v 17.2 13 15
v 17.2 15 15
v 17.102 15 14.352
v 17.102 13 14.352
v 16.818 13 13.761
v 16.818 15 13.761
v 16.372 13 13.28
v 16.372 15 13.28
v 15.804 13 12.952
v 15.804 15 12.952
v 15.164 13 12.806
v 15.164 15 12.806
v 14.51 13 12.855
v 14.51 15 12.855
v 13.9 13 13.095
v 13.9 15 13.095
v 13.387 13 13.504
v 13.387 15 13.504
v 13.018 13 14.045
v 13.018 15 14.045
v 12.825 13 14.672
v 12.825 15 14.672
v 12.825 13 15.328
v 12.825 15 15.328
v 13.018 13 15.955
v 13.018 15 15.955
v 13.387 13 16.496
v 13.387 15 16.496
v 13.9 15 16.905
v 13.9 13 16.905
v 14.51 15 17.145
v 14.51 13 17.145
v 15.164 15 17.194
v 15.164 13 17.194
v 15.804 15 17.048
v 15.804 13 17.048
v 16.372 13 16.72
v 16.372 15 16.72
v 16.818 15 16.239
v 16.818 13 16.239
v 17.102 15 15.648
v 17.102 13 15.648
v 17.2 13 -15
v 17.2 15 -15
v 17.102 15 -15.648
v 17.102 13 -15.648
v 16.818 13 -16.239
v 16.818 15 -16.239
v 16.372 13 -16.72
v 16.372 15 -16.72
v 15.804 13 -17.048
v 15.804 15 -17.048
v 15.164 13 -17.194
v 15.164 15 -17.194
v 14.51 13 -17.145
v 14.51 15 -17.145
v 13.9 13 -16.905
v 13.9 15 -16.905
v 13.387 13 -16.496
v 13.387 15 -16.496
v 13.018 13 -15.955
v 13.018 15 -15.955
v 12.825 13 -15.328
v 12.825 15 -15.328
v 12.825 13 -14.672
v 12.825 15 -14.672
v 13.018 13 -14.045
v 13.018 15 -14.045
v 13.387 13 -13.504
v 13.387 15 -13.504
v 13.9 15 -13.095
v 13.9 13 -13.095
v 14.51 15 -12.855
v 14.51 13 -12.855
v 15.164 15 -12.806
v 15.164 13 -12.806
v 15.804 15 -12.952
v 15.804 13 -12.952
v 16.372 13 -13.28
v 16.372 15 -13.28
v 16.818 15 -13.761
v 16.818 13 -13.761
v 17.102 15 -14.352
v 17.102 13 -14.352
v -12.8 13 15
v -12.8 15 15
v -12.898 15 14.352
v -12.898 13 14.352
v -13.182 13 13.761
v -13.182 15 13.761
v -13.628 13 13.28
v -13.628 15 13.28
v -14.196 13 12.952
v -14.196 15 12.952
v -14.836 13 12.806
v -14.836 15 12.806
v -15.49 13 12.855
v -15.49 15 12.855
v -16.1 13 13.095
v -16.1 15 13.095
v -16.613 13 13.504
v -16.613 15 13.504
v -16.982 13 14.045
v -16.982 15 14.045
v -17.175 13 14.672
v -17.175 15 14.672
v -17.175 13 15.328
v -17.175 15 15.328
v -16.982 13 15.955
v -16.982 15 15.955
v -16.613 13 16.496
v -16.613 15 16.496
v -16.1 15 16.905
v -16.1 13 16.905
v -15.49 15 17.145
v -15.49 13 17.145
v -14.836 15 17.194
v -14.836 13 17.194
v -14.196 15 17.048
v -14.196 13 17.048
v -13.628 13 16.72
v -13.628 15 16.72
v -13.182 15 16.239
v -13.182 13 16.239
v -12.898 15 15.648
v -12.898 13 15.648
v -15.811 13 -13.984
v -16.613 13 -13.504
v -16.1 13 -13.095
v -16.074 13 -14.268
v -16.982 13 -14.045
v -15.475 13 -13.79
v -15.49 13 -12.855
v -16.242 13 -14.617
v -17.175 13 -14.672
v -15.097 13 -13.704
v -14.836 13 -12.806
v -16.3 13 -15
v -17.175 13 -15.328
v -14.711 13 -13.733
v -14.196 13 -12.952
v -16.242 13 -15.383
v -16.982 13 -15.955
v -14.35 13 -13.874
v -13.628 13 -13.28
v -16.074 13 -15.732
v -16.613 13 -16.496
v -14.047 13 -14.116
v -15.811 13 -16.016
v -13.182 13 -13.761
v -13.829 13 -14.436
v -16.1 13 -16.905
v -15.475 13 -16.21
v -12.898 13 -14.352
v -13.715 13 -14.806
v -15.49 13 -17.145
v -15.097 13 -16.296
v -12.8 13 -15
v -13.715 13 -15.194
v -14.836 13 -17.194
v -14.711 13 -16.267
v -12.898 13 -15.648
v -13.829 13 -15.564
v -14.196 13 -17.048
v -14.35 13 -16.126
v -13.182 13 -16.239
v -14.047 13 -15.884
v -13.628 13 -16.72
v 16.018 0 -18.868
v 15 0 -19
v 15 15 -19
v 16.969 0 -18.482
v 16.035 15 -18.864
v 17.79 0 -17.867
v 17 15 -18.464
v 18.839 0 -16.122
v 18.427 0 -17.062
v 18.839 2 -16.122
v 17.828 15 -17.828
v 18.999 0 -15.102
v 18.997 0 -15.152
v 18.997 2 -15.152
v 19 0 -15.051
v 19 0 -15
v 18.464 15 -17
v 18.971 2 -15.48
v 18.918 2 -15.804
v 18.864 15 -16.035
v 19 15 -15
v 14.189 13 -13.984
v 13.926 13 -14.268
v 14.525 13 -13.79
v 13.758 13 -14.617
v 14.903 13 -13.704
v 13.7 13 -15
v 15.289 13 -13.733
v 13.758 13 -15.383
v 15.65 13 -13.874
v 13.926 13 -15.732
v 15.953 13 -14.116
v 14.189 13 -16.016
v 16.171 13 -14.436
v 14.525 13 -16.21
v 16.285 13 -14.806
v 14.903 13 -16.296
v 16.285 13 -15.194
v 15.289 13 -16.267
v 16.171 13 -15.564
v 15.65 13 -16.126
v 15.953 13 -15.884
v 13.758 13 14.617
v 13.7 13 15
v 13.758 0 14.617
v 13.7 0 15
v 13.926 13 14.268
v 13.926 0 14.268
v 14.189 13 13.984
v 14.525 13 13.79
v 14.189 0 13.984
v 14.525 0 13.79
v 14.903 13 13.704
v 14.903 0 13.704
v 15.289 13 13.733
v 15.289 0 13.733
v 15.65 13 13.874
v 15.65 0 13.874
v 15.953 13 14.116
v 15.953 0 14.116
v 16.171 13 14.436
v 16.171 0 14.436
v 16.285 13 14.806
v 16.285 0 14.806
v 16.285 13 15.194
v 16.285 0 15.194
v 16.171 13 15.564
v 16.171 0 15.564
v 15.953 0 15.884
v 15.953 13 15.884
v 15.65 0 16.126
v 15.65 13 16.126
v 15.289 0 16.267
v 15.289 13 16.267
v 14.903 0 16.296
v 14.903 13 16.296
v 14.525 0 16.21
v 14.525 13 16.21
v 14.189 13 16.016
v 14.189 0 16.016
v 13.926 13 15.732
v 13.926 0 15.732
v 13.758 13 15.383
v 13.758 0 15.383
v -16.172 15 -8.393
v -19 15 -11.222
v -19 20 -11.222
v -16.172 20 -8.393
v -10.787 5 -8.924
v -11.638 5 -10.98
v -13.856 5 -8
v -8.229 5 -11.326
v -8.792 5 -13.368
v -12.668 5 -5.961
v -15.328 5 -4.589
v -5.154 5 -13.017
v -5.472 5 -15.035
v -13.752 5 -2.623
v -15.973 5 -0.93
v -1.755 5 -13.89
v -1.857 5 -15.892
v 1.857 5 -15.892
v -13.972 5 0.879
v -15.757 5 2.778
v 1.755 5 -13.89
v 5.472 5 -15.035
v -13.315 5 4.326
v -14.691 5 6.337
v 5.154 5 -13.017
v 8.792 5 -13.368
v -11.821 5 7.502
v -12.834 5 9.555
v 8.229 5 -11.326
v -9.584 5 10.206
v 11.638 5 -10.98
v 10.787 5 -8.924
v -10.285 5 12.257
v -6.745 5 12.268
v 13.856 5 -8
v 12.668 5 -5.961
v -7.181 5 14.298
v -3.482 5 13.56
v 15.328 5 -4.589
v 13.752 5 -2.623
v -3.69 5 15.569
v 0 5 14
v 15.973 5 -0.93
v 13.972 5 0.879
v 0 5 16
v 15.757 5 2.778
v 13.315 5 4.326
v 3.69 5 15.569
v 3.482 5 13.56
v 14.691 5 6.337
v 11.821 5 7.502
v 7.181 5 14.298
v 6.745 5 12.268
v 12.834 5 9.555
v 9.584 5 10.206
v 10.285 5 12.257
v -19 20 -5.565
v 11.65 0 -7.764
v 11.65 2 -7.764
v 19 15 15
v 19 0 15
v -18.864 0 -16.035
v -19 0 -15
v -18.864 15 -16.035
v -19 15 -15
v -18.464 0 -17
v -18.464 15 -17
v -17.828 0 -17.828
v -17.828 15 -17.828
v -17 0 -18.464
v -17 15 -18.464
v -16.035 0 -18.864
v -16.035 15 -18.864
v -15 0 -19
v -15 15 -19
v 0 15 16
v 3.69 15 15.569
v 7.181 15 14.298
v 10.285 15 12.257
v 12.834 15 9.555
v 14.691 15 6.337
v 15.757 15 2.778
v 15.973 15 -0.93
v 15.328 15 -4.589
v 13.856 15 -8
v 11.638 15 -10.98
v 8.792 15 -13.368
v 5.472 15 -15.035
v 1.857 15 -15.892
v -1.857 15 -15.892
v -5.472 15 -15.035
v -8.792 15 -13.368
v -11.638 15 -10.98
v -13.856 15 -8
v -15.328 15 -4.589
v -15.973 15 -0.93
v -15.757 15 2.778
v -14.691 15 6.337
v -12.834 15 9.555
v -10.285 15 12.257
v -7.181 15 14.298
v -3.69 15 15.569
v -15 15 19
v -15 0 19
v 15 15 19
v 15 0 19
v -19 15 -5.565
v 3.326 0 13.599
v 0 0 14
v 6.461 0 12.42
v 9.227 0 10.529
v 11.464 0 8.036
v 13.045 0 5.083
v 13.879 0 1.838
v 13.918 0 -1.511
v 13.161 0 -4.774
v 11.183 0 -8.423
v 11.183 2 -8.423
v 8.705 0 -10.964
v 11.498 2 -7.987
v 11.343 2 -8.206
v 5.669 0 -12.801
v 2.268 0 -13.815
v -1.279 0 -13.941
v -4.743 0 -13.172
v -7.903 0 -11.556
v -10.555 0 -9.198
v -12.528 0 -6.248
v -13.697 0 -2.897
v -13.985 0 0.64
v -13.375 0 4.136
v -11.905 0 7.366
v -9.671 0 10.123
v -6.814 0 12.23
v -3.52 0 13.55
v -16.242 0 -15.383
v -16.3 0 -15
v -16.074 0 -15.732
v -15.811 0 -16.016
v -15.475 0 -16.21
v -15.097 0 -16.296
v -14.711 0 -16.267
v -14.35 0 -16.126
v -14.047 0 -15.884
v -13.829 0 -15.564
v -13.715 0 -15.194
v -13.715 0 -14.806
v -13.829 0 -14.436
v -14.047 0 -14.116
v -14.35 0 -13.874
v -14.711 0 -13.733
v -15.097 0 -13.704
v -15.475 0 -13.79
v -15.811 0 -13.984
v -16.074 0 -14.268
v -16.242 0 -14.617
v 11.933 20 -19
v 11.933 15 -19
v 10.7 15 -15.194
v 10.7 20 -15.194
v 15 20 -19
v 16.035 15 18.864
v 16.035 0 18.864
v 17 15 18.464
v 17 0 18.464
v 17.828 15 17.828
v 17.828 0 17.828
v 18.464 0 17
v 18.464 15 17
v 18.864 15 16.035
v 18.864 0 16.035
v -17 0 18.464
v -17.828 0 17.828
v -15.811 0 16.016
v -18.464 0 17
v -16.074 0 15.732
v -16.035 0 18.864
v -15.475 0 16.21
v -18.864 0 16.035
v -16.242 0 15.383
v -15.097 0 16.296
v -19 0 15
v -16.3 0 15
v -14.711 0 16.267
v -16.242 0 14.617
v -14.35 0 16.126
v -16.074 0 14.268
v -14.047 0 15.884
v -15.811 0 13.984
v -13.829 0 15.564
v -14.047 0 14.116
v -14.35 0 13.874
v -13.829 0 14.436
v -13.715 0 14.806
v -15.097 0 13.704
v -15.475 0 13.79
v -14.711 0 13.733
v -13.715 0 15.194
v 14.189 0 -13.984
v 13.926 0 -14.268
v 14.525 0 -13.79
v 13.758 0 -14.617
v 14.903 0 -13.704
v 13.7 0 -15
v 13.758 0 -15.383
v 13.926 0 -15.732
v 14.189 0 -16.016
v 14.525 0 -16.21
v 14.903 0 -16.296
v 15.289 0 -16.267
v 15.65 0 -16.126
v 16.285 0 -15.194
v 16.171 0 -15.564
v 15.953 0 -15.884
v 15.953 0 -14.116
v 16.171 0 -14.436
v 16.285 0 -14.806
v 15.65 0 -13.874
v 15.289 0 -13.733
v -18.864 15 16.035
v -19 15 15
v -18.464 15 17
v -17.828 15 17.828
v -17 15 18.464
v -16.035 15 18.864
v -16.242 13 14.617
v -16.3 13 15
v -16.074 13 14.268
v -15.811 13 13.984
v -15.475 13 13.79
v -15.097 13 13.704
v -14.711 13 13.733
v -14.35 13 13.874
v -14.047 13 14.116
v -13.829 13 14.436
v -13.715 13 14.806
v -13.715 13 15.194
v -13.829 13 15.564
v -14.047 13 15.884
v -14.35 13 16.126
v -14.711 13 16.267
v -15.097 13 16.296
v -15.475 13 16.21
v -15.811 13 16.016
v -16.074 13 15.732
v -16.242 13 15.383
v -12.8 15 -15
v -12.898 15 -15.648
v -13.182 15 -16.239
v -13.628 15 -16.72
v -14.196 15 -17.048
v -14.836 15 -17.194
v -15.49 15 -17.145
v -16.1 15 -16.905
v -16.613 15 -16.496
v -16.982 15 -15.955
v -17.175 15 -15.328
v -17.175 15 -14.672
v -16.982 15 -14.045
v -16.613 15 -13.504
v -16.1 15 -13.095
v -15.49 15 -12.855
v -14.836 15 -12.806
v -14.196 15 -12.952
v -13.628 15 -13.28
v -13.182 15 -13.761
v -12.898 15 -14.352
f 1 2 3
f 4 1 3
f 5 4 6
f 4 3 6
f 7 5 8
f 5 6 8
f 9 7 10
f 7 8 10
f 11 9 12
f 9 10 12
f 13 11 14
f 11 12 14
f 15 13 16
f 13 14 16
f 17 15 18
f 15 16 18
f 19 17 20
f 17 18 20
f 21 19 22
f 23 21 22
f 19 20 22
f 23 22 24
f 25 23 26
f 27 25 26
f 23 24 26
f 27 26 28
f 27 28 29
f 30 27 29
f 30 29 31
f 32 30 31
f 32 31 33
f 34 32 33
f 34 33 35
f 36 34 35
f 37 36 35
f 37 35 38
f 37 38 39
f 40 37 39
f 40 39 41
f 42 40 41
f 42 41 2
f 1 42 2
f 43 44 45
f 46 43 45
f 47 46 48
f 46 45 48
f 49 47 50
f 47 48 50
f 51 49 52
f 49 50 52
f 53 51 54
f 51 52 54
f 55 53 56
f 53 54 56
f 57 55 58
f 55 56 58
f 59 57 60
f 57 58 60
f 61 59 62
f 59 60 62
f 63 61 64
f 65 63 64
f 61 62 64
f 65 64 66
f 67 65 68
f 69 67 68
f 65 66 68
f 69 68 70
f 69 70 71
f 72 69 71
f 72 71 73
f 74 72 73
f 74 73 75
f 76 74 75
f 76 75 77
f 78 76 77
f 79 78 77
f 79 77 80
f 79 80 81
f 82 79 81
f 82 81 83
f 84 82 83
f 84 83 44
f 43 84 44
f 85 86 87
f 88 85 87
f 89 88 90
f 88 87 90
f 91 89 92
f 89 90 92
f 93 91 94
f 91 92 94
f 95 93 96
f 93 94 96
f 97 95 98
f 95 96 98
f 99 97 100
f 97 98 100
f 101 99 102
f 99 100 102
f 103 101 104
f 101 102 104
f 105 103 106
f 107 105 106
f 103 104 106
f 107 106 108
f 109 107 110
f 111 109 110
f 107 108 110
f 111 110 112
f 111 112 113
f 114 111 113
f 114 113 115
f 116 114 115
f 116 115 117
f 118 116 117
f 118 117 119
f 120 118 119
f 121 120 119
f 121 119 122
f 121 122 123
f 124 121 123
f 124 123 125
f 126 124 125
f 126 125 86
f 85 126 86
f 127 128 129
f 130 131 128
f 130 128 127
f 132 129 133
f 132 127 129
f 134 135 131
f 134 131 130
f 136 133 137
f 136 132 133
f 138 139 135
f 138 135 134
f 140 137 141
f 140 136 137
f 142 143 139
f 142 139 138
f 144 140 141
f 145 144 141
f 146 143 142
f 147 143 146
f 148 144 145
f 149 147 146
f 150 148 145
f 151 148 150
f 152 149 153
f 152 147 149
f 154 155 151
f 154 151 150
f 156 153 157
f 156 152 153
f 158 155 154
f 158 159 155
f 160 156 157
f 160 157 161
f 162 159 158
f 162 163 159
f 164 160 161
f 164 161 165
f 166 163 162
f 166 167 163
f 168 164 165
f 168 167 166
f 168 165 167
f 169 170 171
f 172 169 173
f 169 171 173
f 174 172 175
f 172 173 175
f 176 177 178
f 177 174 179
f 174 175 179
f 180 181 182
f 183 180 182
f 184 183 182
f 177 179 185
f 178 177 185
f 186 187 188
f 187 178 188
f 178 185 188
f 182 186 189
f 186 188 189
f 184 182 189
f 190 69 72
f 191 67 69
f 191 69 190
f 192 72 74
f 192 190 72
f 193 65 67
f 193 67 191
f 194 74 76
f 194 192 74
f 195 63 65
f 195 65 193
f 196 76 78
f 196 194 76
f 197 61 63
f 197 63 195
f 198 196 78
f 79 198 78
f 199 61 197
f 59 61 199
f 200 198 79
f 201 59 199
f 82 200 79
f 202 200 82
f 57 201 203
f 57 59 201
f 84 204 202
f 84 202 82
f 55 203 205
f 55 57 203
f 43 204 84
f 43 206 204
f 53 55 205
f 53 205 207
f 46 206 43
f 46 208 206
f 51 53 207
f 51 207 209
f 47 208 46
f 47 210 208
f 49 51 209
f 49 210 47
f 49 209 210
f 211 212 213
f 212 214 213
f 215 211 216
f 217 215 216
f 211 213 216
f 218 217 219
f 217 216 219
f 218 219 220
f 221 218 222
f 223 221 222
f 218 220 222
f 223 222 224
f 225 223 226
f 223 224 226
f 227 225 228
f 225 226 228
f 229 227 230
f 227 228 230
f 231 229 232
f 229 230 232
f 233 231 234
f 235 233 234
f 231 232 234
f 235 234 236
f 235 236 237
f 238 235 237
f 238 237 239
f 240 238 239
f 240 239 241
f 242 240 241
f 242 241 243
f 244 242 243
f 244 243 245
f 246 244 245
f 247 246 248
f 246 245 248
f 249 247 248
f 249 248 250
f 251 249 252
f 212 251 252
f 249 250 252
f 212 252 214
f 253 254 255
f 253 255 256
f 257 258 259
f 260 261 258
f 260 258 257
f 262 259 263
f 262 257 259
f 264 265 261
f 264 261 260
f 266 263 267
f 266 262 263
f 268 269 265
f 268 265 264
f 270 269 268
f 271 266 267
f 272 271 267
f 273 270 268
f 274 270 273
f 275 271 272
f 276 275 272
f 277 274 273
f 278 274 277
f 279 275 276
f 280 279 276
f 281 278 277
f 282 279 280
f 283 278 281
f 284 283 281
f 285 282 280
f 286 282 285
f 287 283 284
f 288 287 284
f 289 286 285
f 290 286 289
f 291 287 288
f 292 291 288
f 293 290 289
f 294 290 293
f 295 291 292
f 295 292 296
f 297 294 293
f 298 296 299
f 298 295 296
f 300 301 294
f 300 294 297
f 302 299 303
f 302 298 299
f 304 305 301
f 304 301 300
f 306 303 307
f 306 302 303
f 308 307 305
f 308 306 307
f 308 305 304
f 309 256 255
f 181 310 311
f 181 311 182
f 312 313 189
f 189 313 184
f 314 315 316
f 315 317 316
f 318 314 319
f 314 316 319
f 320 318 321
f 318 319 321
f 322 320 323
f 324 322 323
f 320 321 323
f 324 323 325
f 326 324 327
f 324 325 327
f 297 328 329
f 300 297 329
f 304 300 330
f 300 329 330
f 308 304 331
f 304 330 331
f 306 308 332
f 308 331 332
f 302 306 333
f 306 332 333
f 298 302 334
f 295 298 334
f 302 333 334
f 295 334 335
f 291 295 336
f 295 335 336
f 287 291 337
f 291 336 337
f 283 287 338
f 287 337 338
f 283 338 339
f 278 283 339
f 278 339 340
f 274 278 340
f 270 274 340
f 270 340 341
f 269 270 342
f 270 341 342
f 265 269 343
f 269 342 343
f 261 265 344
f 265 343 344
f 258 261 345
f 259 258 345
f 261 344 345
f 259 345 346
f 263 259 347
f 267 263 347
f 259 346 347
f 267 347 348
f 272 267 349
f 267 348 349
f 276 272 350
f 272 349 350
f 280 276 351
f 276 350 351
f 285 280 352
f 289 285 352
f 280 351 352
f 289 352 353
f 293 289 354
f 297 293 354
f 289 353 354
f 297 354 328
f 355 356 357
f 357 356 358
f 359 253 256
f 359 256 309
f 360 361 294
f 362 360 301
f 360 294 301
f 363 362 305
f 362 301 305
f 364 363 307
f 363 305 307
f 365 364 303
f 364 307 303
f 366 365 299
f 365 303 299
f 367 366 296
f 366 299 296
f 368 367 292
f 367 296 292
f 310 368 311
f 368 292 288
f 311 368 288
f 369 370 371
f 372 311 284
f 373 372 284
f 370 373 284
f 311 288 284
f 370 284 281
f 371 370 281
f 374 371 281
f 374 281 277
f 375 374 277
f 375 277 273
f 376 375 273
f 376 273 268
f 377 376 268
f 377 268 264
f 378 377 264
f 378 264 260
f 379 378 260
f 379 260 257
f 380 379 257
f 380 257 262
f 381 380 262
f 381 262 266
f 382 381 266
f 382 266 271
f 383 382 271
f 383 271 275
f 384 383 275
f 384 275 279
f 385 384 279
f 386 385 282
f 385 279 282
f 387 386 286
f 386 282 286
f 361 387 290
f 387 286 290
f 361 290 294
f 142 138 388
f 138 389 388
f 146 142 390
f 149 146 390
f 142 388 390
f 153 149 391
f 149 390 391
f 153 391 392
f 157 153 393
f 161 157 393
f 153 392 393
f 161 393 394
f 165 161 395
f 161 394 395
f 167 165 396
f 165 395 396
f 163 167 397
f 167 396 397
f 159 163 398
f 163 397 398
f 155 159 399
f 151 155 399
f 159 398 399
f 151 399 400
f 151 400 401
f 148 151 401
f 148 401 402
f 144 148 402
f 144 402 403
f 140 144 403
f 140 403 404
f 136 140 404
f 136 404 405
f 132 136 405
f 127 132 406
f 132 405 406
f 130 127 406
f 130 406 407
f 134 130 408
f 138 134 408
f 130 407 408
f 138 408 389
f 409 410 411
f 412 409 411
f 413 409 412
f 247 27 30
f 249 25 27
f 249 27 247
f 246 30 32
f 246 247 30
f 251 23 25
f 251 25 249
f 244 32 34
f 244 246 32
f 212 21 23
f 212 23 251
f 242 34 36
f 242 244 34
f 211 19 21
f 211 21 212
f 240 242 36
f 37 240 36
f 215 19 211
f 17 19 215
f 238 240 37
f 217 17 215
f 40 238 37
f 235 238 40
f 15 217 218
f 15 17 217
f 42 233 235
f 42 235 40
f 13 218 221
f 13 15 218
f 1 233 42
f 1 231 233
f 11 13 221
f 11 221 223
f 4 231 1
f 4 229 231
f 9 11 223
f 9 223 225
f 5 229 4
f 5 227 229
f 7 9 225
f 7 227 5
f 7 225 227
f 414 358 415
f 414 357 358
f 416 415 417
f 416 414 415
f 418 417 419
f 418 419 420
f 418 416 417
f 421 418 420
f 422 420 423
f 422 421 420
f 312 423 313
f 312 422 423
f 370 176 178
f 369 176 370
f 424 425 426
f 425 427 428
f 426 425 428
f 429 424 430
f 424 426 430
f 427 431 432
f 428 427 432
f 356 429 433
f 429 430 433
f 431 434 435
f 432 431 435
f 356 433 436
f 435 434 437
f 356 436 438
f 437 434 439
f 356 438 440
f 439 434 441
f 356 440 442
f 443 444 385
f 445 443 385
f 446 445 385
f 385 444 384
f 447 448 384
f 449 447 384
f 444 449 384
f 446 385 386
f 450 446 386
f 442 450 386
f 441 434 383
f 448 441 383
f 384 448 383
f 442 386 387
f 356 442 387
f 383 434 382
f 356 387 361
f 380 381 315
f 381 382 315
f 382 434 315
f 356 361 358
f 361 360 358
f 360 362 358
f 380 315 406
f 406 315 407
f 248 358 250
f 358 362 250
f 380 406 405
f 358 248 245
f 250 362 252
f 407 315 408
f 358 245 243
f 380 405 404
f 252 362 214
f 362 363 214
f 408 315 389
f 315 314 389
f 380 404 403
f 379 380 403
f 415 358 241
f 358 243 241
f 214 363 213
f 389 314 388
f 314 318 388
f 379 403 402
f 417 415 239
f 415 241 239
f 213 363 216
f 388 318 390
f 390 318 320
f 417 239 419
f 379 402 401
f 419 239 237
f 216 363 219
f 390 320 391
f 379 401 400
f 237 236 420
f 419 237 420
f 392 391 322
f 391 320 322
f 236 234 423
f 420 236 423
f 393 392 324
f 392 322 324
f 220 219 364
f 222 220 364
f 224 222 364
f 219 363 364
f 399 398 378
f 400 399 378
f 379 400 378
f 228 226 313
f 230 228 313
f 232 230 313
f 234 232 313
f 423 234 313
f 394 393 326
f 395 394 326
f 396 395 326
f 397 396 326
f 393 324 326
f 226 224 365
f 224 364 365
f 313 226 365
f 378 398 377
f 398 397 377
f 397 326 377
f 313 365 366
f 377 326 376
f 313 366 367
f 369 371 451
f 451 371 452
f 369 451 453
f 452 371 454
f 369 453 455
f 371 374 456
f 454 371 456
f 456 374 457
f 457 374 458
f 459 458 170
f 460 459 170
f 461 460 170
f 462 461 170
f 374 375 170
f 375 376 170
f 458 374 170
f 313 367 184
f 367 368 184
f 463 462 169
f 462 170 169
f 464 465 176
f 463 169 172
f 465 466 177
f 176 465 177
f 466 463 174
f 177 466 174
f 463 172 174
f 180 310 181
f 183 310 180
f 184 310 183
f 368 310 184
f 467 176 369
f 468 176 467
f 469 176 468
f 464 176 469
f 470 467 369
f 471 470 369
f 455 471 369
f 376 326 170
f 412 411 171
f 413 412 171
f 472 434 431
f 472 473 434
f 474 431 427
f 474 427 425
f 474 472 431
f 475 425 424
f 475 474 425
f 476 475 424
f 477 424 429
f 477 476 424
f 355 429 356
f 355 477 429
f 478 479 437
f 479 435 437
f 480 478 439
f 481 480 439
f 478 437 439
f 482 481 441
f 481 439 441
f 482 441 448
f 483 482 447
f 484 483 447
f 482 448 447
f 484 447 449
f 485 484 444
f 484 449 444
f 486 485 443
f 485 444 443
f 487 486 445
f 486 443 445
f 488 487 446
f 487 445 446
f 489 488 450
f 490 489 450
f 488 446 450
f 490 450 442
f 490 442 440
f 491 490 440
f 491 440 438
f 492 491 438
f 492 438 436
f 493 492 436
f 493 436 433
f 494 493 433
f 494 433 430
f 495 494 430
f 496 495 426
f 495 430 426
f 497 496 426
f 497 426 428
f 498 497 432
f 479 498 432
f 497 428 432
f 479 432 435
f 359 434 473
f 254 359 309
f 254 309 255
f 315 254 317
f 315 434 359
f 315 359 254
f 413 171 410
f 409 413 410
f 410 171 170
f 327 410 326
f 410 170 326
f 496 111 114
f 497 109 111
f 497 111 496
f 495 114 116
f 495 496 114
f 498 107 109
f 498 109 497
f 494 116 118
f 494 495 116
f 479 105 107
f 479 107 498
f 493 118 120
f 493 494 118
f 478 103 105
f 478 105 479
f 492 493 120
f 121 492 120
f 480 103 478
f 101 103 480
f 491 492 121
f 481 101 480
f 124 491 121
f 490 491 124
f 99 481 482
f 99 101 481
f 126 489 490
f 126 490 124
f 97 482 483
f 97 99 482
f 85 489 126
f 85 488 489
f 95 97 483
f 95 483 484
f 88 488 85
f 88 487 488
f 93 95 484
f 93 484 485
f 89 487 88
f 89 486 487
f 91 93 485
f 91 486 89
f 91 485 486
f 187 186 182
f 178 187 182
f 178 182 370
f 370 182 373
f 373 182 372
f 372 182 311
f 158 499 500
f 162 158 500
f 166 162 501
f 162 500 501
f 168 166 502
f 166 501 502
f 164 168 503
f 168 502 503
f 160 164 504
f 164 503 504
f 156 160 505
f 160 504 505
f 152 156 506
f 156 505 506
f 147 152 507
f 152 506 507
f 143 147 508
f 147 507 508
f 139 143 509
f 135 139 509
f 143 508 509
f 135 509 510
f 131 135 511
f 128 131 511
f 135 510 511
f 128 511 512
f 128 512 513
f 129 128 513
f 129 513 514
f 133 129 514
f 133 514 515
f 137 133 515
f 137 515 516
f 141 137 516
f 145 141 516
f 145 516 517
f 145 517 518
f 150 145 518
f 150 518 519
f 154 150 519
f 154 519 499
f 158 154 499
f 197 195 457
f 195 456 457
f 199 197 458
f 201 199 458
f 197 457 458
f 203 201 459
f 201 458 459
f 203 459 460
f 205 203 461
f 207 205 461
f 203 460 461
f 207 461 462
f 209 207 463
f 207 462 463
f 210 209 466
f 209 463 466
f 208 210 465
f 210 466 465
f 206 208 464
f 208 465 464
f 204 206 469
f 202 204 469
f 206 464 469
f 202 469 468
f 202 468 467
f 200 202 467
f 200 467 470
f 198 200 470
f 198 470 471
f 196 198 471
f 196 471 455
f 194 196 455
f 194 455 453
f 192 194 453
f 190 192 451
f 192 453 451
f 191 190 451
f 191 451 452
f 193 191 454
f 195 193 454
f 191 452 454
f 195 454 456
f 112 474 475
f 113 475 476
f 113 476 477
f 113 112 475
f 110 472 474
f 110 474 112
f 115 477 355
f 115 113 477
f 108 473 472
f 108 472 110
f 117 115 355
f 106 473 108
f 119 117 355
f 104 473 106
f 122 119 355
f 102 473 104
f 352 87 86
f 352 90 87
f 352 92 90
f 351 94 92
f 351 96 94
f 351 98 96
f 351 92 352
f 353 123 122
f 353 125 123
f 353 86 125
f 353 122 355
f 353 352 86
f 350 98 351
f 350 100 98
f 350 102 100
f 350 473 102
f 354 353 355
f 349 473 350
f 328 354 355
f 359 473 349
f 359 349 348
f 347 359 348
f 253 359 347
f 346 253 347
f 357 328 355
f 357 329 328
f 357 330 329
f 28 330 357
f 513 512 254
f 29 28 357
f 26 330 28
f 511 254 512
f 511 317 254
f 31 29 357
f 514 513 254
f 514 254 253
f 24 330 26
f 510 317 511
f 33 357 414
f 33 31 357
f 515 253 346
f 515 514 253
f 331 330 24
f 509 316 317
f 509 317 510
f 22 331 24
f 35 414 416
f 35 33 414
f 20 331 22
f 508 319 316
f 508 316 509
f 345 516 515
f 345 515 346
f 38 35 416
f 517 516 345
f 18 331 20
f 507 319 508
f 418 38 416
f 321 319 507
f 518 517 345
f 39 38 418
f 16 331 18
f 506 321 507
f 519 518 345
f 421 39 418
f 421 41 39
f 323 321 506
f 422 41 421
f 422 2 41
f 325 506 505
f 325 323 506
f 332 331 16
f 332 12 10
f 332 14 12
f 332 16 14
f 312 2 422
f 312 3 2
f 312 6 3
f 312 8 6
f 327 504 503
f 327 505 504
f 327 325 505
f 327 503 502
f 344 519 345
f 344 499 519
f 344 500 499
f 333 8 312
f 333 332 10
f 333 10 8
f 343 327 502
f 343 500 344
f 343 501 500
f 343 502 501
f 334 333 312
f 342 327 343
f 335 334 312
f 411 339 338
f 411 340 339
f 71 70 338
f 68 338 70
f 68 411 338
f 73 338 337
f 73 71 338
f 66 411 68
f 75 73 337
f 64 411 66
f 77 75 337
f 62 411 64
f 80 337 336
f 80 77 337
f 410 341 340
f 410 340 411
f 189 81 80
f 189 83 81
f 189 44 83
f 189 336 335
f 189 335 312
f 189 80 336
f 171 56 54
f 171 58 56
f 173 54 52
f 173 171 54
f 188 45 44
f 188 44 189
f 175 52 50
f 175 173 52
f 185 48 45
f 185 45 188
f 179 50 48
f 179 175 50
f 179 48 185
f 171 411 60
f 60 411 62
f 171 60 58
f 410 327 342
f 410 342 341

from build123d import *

# Parameters (mm, degrees)
SKETCH1_W                      = 38
SKETCH1_H                      = 38
BOSS_EXTRUDE1_DEPTH            = 15
SKETCH2_R                      = 16
CUT_EXTRUDE1_DEPTH             = 10
SKETCH2_3_R                    = 14
CUT_EXTRUDE3_DEPTH             = 31.773365107
FILLET1_R                      = 4
CBORE_FOR_M2_SHCS1_D           = 2.6
CBORE_FOR_M2_SHCS1_CBORE_D     = 4.4
CBORE_FOR_M2_SHCS1_CBORE_DEPTH = 2
CUT_EXTRUDE4_DEPTH             = 2
BOSS_EXTRUDE3_DEPTH            = 5


with BuildPart() as part:
    # Sketch1 → Boss-Extrude1 (new body)
    with BuildSketch(Plane(origin=(0, 0, 0), x_dir=(1, 0, 0), z_dir=(0, 1, 0))):
        Rectangle(SKETCH1_W, SKETCH1_H)
    extrude(amount=BOSS_EXTRUDE1_DEPTH)

    # Sketch2 → Cut-Extrude1 (cut)
    with BuildSketch(Plane(origin=(0, 15, 0), x_dir=(1, 0, 0), z_dir=(0, 1, 0))):
        Circle(SKETCH2_R)
    extrude(amount=-CUT_EXTRUDE1_DEPTH, mode=Mode.SUBTRACT)

    # Sketch2<3> → Cut-Extrude3 (cut, through all)
    with BuildSketch(Plane(origin=(0, 15, 0), x_dir=(1, 0, 0), z_dir=(0, 1, 0))):
        Circle(SKETCH2_3_R)
    extrude(amount=-CUT_EXTRUDE3_DEPTH, mode=Mode.SUBTRACT)

    # Fillet1
    fillet1_edges = [part.edges().sort_by_distance(p)[0] for p in [
        (-19, 7.5, 19),
        (19, 7.5, 19),
        (-19, 7.5, -19),
        (19, 7.5, -19),
    ]]
    fillet(fillet1_edges, radius=FILLET1_R)

    # CBORE for M2 SHCS1 (through all)
    with Locations(Plane(origin=(0, 15, 0), x_dir=(1, 0, 0), z_dir=(0, 1, 0))):
        with Locations((-15, 15), (15, 15), (-15, -15), (15, -15)):
            CounterBoreHole(CBORE_FOR_M2_SHCS1_D / 2, CBORE_FOR_M2_SHCS1_CBORE_D / 2, CBORE_FOR_M2_SHCS1_CBORE_DEPTH)

    # Sketch6 → Cut-Extrude4 (cut)
    with BuildSketch(Plane.XZ):
        Polygon((0.343583705, 2.476277496), (0.481017187, 3.466788495), (19, -15.155263686), (19, -16.283973067), align=None)
    extrude(amount=-CUT_EXTRUDE4_DEPTH, mode=Mode.SUBTRACT)

    # Sketch7 → Boss-Extrude3 (add)
    with BuildSketch(Plane(origin=(0, 15, 0), x_dir=(1, 0, 0), z_dir=(0, 1, 0))):
        Polygon((-19, 11.221825407), (-16.171572875, 8.393398282), (-19, 5.564971157), align=None)
        Polygon((11.932562755, 19), (10.700479231, 15.194481614), (15, 19), align=None)
    extrude(amount=BOSS_EXTRUDE3_DEPTH)


solid = part.part
